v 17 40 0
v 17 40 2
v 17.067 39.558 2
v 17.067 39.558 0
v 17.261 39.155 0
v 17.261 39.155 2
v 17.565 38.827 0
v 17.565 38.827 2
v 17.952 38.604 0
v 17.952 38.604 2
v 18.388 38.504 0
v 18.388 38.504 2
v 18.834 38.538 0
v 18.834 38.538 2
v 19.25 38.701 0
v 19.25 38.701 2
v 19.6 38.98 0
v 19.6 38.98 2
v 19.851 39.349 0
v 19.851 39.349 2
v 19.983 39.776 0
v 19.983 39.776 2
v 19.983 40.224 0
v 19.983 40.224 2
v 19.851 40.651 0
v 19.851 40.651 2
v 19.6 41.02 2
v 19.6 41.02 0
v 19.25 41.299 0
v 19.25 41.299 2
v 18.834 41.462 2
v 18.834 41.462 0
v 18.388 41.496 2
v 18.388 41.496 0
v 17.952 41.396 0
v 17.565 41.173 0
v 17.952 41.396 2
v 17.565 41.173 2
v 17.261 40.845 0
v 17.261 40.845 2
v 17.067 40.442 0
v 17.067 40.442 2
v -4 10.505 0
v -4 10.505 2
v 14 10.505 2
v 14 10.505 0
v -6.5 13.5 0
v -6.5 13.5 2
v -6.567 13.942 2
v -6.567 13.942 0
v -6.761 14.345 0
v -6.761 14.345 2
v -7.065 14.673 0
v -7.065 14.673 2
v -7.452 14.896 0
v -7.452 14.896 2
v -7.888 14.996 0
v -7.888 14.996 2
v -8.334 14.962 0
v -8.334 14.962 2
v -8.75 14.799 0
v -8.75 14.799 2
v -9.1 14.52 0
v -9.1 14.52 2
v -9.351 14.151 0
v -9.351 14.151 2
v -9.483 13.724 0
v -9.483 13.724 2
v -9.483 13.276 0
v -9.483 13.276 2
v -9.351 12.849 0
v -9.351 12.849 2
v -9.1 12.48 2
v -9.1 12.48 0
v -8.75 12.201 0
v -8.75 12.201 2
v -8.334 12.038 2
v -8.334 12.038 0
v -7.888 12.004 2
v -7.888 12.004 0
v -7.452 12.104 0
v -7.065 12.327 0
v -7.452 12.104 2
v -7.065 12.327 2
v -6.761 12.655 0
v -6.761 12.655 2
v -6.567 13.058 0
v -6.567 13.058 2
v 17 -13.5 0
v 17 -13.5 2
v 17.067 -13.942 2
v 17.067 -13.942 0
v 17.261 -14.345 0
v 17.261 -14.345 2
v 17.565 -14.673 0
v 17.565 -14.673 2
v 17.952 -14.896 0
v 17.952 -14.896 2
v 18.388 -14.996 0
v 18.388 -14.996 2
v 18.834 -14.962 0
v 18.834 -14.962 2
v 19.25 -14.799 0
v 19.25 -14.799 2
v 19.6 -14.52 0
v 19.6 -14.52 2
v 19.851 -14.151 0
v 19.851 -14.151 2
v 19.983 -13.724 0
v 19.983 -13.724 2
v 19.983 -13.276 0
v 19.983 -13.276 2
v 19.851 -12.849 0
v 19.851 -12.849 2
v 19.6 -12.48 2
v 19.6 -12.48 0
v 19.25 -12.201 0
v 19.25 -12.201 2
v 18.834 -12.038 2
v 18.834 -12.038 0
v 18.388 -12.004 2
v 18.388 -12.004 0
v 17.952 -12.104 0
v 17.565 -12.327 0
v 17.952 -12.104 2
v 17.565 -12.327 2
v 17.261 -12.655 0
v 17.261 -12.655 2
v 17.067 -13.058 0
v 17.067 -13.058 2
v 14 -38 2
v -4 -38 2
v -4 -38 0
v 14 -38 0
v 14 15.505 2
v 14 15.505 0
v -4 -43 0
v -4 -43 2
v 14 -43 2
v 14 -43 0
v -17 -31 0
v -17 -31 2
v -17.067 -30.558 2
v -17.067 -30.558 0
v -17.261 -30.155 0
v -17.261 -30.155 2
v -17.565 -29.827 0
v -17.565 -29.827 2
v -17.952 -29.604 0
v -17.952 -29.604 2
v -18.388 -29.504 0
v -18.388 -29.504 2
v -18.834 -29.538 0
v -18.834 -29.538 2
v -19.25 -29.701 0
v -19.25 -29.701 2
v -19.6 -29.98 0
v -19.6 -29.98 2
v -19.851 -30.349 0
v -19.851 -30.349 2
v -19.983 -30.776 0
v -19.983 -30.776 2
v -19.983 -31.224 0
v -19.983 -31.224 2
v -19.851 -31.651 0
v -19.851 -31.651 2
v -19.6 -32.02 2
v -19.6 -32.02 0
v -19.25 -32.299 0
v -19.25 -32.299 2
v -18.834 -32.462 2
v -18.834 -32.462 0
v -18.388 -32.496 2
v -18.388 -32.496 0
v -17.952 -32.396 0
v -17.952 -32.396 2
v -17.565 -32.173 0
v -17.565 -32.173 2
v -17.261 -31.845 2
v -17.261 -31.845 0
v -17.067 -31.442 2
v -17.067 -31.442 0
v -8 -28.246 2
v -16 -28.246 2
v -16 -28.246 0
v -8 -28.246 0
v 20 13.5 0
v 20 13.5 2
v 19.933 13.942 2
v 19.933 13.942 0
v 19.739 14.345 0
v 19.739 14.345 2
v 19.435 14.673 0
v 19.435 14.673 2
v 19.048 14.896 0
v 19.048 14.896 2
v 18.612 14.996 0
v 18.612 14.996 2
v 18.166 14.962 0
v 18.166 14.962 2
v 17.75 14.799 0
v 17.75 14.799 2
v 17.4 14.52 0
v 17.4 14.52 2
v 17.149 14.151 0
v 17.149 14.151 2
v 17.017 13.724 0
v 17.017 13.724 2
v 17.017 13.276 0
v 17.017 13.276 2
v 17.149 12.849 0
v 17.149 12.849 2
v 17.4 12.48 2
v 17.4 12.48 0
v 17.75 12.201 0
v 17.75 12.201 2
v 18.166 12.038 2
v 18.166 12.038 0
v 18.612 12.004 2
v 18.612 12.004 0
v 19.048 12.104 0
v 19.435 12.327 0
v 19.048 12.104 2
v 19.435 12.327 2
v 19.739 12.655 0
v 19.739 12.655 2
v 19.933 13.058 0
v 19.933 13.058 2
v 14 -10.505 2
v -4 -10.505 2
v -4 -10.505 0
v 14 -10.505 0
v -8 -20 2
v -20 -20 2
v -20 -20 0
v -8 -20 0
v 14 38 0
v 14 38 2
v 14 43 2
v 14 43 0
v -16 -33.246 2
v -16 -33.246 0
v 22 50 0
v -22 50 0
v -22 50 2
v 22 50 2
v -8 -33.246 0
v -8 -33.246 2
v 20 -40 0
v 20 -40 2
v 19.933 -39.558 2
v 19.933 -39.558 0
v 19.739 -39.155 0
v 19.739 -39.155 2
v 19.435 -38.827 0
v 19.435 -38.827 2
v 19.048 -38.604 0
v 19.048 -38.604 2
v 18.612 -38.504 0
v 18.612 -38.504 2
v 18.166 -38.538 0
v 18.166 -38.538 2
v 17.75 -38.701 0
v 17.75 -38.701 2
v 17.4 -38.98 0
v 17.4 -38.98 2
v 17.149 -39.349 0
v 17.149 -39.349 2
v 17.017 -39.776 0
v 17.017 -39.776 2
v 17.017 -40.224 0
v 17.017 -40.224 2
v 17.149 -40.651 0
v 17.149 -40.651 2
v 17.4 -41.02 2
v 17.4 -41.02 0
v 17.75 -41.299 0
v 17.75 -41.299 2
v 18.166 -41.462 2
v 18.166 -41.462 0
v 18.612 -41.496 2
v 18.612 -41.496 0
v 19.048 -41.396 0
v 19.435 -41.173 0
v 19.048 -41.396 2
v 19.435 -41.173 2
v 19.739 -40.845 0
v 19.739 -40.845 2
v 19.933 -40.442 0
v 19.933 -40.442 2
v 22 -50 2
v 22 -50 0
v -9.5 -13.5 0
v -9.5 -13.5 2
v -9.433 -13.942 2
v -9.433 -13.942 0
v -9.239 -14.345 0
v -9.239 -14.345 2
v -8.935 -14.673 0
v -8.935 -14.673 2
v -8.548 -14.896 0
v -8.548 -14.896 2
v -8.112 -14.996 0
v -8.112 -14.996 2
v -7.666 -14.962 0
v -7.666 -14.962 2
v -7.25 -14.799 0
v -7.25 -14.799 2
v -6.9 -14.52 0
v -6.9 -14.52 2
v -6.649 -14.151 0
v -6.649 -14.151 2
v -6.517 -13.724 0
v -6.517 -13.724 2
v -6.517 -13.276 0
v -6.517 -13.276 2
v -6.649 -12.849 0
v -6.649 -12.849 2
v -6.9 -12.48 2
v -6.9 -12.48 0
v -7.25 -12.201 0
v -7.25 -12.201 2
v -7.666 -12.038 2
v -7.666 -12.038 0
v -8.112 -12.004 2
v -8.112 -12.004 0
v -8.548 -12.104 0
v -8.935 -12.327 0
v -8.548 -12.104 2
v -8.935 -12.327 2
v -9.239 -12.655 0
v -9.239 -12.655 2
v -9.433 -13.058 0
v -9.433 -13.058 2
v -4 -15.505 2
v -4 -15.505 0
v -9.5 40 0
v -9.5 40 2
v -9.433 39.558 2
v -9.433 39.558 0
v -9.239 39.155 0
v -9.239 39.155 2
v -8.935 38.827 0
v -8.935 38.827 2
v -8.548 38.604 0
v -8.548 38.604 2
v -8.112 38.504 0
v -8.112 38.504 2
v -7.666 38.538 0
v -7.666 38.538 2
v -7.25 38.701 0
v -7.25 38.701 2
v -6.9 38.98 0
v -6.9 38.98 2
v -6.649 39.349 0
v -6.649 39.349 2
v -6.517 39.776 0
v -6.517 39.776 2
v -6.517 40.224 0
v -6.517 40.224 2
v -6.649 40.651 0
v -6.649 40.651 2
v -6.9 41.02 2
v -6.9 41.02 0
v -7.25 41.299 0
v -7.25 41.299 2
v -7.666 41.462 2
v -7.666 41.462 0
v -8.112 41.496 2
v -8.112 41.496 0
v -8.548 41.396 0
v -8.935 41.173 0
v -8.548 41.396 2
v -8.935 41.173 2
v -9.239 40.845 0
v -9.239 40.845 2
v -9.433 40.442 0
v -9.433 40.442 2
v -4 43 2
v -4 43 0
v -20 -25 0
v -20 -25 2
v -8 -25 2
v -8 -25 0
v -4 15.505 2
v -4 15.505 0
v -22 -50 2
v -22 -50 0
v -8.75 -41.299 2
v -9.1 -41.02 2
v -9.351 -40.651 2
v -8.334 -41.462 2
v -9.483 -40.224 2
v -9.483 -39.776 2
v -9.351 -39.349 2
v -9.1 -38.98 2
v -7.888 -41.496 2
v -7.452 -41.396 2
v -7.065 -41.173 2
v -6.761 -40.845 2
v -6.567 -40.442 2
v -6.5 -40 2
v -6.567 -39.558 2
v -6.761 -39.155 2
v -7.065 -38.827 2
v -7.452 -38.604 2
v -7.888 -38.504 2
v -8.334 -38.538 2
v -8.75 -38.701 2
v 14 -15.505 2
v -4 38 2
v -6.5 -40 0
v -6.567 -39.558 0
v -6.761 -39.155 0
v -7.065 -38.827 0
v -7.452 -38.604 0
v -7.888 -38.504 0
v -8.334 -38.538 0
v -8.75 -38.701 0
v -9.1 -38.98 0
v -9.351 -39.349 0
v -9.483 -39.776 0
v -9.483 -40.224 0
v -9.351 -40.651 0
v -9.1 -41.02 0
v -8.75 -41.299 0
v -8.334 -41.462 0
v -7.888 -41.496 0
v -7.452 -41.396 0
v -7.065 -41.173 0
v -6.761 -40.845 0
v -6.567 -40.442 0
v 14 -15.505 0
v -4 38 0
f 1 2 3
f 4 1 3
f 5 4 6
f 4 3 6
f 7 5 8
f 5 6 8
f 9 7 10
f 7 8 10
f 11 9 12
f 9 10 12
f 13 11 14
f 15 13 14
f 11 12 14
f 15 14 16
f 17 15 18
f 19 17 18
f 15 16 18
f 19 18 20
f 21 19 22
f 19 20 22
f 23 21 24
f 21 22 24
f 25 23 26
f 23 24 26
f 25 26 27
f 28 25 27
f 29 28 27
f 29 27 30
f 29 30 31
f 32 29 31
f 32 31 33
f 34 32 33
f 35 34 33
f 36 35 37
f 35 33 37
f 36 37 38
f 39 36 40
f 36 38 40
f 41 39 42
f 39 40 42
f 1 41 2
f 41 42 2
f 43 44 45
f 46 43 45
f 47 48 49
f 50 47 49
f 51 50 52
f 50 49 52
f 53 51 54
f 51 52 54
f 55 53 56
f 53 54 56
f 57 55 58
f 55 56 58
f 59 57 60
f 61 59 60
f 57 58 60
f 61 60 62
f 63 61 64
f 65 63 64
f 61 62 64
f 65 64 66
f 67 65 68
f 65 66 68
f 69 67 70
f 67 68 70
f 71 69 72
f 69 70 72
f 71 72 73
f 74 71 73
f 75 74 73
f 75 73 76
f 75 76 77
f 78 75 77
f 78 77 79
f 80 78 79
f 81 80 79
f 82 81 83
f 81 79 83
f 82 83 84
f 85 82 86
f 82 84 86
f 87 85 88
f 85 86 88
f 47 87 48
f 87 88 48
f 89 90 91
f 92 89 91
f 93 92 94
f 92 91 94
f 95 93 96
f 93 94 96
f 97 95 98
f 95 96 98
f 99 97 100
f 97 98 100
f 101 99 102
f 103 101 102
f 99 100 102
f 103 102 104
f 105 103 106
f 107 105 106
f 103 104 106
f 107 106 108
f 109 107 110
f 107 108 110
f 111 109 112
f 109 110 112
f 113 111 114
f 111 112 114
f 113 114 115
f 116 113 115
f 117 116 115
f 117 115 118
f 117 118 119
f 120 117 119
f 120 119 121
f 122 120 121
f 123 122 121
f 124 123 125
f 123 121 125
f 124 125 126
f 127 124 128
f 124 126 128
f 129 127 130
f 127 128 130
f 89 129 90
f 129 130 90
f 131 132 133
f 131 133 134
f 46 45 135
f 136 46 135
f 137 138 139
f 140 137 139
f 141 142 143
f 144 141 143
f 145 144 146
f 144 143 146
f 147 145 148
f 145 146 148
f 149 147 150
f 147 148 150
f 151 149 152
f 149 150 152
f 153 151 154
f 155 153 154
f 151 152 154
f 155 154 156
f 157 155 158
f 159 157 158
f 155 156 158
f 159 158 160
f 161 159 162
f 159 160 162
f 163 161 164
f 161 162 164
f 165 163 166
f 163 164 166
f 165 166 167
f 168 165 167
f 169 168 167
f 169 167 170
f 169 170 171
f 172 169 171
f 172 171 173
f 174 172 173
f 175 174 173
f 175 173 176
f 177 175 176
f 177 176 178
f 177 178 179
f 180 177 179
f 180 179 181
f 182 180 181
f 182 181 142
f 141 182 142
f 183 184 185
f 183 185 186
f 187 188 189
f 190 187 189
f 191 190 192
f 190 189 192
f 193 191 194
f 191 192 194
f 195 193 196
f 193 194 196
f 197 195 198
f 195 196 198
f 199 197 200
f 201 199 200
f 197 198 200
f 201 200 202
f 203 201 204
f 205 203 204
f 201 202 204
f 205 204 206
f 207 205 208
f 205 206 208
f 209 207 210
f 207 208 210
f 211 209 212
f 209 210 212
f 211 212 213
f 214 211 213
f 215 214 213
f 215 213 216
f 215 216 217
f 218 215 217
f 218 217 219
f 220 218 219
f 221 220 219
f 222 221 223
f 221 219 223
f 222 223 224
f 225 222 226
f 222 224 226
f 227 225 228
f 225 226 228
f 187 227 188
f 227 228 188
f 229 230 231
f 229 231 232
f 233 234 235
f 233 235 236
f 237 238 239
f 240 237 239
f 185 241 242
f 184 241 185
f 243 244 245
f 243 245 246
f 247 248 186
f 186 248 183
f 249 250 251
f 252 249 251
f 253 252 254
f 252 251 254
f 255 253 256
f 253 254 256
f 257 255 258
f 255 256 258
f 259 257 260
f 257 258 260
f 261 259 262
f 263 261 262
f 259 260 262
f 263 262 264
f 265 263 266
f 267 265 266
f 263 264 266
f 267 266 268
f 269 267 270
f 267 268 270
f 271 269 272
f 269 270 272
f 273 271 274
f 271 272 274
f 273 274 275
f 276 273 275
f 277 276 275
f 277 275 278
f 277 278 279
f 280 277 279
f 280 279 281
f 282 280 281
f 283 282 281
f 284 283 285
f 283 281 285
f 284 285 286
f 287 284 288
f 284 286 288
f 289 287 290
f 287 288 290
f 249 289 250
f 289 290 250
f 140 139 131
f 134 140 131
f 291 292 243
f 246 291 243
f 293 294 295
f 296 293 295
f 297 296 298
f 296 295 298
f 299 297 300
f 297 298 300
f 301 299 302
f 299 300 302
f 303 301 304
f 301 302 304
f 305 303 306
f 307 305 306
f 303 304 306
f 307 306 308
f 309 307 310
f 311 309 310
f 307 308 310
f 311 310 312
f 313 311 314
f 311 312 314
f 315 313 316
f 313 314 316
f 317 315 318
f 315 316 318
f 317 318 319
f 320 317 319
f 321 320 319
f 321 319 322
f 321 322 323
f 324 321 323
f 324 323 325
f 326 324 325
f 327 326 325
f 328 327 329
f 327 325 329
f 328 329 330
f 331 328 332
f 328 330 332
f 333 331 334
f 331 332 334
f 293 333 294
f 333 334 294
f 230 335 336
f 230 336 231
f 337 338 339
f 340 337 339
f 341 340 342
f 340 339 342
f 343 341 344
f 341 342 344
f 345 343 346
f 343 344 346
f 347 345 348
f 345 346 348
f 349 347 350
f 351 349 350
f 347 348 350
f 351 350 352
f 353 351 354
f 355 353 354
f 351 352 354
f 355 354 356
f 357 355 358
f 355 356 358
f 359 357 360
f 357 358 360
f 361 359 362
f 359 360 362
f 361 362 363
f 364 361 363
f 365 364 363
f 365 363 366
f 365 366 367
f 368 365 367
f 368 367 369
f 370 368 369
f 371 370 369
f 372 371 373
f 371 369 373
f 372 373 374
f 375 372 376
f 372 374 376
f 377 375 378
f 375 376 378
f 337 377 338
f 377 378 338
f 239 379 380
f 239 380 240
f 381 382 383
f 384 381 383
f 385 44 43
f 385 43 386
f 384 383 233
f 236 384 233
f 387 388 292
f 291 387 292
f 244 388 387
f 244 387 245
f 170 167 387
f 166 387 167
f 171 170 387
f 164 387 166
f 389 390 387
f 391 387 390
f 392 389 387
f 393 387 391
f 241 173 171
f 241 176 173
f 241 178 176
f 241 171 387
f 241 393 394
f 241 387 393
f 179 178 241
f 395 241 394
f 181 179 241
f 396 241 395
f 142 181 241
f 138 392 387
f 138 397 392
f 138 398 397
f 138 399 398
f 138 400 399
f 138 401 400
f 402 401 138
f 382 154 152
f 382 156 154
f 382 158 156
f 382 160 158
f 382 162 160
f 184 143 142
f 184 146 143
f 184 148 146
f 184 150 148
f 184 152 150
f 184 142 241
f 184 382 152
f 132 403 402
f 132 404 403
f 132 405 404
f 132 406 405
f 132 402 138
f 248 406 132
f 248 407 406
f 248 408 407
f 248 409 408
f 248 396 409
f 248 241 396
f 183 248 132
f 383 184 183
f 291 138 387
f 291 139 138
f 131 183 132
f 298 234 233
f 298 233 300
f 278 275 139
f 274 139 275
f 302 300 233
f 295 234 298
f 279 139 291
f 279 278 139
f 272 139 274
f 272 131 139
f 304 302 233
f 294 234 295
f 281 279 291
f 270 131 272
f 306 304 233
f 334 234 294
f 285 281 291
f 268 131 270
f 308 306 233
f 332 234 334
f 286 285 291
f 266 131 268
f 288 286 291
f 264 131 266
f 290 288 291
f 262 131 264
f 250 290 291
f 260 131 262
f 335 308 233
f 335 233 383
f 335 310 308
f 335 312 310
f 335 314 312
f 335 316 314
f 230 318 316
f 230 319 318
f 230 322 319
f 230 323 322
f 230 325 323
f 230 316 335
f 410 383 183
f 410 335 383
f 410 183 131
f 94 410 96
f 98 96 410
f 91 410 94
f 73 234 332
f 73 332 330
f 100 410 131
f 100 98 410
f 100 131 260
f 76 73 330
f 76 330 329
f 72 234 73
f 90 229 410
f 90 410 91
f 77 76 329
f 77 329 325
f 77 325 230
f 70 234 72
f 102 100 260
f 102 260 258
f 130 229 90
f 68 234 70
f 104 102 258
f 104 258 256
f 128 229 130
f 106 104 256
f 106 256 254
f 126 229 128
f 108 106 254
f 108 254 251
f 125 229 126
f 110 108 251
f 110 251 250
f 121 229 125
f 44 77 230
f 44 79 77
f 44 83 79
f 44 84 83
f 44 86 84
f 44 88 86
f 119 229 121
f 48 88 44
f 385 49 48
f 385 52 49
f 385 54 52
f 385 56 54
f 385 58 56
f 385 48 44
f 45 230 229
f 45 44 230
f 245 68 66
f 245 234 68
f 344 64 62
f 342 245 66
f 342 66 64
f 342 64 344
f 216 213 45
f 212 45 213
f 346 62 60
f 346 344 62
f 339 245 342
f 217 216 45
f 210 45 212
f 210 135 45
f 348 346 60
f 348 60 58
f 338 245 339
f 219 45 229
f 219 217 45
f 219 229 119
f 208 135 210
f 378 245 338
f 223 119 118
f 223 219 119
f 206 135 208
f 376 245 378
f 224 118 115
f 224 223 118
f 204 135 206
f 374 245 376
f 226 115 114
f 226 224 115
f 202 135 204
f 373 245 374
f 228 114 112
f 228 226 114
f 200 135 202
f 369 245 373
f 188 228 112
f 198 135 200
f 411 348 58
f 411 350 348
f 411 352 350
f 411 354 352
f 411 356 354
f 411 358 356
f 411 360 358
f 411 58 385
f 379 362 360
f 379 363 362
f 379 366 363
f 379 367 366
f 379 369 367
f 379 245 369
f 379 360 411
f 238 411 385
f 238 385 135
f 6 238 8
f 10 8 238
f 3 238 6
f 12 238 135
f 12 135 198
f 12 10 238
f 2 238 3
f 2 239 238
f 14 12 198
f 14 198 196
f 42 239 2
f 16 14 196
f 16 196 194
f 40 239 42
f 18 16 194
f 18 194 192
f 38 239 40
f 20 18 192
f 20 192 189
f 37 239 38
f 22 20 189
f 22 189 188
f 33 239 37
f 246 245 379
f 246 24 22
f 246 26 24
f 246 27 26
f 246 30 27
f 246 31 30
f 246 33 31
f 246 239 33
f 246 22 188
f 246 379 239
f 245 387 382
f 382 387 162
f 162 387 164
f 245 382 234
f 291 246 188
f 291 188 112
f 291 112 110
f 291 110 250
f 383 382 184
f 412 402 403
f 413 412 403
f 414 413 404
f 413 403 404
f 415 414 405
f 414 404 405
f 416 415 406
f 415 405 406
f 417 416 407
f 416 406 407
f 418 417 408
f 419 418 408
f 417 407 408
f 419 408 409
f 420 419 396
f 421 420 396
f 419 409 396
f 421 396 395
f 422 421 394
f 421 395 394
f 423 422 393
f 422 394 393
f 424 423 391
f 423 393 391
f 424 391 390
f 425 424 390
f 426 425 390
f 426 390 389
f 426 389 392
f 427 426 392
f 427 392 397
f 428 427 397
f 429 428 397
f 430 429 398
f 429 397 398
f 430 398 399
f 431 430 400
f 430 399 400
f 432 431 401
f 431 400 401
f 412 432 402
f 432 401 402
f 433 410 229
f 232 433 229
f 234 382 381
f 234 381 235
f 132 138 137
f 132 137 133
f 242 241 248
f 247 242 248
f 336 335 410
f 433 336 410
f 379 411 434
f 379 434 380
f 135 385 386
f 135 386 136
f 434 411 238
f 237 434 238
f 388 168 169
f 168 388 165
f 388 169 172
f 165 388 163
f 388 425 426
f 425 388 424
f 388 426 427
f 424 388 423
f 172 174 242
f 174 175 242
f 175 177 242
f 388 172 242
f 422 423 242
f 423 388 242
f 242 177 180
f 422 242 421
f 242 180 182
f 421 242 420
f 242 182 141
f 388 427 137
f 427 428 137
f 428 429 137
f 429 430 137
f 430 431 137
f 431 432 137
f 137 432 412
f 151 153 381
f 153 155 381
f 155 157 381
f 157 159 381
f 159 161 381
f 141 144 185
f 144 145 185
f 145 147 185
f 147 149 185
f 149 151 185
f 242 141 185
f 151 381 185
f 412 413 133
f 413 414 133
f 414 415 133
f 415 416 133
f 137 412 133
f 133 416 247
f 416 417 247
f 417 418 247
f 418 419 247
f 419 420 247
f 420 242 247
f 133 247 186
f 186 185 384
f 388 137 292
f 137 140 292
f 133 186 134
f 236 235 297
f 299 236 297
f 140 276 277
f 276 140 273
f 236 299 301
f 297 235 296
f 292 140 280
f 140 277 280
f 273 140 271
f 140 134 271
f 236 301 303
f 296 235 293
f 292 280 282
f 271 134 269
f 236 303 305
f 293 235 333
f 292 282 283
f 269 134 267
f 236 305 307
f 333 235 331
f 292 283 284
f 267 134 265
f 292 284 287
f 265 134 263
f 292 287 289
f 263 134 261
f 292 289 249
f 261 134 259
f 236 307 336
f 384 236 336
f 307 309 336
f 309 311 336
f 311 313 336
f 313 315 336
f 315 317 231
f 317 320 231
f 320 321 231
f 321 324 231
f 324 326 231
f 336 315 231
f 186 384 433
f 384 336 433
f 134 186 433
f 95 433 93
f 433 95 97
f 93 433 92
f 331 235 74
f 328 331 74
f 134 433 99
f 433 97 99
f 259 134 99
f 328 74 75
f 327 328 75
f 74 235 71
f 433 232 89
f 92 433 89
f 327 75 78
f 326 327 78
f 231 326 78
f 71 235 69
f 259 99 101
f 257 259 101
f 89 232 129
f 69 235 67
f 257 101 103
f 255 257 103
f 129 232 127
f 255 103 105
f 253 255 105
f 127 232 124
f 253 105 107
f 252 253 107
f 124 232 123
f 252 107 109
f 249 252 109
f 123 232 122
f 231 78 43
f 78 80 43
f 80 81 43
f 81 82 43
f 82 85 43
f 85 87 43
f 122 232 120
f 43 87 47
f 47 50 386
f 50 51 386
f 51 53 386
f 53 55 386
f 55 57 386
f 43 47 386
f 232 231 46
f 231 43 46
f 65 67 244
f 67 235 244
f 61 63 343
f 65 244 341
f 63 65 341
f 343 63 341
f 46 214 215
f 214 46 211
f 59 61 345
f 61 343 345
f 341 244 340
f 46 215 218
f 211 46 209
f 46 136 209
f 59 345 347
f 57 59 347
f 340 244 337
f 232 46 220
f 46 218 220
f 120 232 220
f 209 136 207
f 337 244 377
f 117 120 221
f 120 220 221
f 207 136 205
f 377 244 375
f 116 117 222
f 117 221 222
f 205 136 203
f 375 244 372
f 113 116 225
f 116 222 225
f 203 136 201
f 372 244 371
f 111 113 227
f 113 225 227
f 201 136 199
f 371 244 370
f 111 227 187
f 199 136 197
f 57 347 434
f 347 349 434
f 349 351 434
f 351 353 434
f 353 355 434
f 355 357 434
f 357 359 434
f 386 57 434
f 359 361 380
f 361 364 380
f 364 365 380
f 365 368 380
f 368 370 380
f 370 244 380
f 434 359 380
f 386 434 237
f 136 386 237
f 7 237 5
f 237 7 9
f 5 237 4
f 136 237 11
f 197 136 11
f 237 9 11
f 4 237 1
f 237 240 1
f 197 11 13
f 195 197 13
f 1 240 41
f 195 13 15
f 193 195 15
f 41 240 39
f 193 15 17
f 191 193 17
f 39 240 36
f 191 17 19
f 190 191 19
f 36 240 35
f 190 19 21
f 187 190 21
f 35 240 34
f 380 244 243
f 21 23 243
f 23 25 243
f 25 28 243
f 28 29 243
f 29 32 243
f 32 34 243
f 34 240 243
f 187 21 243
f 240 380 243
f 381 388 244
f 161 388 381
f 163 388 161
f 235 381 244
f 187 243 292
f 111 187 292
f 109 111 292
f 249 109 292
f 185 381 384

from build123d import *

# Parameters (mm, degrees)
SKETCH1_W           = 44
SKETCH1_H           = 100
BOSS_EXTRUDE1_DEPTH = 2
SKETCH2_R           = 1.5
CUT_EXTRUDE1_DEPTH  = 2
SKETCH3_W           = 18
SKETCH3_H           = 5
CUT_EXTRUDE2_DEPTH  = 10
SKETCH4_R           = 1.5
SKETCH4_W           = 12
SKETCH4_H           = 5
SKETCH4_W_2         = 8
CUT_EXTRUDE3_DEPTH  = 55.662601475


with BuildPart() as part:
    # Sketch1 → Boss-Extrude1 (new body)
    with BuildSketch(Plane.XY):
        Rectangle(SKETCH1_W, SKETCH1_H)
    extrude(amount=BOSS_EXTRUDE1_DEPTH)

    # Sketch2 → Cut-Extrude1 (cut)
    with BuildSketch(Plane.XY.offset(2)):
        with Locations((-8, -40)):
            Circle(SKETCH2_R)
        with Locations((18.5, -40)):
            Circle(SKETCH2_R)
        with Locations(Location((18.5, -13.5, 0), (0, 0, 180))):
            Circle(SKETCH2_R)
        with Locations(Location((-8, -13.5, 0), (0, 0, 180))):
            Circle(SKETCH2_R)
        with Locations(Location((18.5, 40, 0), (0, 0, 180))):
            Circle(SKETCH2_R)
        with Locations(Location((-8, 40, 0), (0, 0, 180))):
            Circle(SKETCH2_R)
        with Locations((18.5, 13.5)):
            Circle(SKETCH2_R)
        with Locations((-8, 13.5)):
            Circle(SKETCH2_R)
    extrude(amount=-CUT_EXTRUDE1_DEPTH, mode=Mode.SUBTRACT)

    # Sketch3 → Cut-Extrude2 (cut)
    with BuildSketch(Plane.XY.offset(2)):
        with Locations((5, 40.5)):
            Rectangle(SKETCH3_W, SKETCH3_H)
        with Locations((5, 13.004717401)):
            Rectangle(SKETCH3_W, SKETCH3_H)
        with Locations((5, -13.004717401)):
            Rectangle(SKETCH3_W, SKETCH3_H)
        with Locations((5, -40.5)):
            Rectangle(SKETCH3_W, SKETCH3_H)
    extrude(amount=-CUT_EXTRUDE2_DEPTH, mode=Mode.SUBTRACT)

    # Sketch4 → Cut-Extrude3 (cut, through all)
    with BuildSketch(Plane.XY.offset(2)):
        with Locations((-18.5, -31)):
            Circle(SKETCH4_R)
        with Locations((-14, -22.5)):
            Rectangle(SKETCH4_W, SKETCH4_H)
        with Locations((-12, -30.746090286)):
            Rectangle(SKETCH4_W_2, SKETCH4_H)
    extrude(amount=-CUT_EXTRUDE3_DEPTH, mode=Mode.SUBTRACT)


solid = part.part
